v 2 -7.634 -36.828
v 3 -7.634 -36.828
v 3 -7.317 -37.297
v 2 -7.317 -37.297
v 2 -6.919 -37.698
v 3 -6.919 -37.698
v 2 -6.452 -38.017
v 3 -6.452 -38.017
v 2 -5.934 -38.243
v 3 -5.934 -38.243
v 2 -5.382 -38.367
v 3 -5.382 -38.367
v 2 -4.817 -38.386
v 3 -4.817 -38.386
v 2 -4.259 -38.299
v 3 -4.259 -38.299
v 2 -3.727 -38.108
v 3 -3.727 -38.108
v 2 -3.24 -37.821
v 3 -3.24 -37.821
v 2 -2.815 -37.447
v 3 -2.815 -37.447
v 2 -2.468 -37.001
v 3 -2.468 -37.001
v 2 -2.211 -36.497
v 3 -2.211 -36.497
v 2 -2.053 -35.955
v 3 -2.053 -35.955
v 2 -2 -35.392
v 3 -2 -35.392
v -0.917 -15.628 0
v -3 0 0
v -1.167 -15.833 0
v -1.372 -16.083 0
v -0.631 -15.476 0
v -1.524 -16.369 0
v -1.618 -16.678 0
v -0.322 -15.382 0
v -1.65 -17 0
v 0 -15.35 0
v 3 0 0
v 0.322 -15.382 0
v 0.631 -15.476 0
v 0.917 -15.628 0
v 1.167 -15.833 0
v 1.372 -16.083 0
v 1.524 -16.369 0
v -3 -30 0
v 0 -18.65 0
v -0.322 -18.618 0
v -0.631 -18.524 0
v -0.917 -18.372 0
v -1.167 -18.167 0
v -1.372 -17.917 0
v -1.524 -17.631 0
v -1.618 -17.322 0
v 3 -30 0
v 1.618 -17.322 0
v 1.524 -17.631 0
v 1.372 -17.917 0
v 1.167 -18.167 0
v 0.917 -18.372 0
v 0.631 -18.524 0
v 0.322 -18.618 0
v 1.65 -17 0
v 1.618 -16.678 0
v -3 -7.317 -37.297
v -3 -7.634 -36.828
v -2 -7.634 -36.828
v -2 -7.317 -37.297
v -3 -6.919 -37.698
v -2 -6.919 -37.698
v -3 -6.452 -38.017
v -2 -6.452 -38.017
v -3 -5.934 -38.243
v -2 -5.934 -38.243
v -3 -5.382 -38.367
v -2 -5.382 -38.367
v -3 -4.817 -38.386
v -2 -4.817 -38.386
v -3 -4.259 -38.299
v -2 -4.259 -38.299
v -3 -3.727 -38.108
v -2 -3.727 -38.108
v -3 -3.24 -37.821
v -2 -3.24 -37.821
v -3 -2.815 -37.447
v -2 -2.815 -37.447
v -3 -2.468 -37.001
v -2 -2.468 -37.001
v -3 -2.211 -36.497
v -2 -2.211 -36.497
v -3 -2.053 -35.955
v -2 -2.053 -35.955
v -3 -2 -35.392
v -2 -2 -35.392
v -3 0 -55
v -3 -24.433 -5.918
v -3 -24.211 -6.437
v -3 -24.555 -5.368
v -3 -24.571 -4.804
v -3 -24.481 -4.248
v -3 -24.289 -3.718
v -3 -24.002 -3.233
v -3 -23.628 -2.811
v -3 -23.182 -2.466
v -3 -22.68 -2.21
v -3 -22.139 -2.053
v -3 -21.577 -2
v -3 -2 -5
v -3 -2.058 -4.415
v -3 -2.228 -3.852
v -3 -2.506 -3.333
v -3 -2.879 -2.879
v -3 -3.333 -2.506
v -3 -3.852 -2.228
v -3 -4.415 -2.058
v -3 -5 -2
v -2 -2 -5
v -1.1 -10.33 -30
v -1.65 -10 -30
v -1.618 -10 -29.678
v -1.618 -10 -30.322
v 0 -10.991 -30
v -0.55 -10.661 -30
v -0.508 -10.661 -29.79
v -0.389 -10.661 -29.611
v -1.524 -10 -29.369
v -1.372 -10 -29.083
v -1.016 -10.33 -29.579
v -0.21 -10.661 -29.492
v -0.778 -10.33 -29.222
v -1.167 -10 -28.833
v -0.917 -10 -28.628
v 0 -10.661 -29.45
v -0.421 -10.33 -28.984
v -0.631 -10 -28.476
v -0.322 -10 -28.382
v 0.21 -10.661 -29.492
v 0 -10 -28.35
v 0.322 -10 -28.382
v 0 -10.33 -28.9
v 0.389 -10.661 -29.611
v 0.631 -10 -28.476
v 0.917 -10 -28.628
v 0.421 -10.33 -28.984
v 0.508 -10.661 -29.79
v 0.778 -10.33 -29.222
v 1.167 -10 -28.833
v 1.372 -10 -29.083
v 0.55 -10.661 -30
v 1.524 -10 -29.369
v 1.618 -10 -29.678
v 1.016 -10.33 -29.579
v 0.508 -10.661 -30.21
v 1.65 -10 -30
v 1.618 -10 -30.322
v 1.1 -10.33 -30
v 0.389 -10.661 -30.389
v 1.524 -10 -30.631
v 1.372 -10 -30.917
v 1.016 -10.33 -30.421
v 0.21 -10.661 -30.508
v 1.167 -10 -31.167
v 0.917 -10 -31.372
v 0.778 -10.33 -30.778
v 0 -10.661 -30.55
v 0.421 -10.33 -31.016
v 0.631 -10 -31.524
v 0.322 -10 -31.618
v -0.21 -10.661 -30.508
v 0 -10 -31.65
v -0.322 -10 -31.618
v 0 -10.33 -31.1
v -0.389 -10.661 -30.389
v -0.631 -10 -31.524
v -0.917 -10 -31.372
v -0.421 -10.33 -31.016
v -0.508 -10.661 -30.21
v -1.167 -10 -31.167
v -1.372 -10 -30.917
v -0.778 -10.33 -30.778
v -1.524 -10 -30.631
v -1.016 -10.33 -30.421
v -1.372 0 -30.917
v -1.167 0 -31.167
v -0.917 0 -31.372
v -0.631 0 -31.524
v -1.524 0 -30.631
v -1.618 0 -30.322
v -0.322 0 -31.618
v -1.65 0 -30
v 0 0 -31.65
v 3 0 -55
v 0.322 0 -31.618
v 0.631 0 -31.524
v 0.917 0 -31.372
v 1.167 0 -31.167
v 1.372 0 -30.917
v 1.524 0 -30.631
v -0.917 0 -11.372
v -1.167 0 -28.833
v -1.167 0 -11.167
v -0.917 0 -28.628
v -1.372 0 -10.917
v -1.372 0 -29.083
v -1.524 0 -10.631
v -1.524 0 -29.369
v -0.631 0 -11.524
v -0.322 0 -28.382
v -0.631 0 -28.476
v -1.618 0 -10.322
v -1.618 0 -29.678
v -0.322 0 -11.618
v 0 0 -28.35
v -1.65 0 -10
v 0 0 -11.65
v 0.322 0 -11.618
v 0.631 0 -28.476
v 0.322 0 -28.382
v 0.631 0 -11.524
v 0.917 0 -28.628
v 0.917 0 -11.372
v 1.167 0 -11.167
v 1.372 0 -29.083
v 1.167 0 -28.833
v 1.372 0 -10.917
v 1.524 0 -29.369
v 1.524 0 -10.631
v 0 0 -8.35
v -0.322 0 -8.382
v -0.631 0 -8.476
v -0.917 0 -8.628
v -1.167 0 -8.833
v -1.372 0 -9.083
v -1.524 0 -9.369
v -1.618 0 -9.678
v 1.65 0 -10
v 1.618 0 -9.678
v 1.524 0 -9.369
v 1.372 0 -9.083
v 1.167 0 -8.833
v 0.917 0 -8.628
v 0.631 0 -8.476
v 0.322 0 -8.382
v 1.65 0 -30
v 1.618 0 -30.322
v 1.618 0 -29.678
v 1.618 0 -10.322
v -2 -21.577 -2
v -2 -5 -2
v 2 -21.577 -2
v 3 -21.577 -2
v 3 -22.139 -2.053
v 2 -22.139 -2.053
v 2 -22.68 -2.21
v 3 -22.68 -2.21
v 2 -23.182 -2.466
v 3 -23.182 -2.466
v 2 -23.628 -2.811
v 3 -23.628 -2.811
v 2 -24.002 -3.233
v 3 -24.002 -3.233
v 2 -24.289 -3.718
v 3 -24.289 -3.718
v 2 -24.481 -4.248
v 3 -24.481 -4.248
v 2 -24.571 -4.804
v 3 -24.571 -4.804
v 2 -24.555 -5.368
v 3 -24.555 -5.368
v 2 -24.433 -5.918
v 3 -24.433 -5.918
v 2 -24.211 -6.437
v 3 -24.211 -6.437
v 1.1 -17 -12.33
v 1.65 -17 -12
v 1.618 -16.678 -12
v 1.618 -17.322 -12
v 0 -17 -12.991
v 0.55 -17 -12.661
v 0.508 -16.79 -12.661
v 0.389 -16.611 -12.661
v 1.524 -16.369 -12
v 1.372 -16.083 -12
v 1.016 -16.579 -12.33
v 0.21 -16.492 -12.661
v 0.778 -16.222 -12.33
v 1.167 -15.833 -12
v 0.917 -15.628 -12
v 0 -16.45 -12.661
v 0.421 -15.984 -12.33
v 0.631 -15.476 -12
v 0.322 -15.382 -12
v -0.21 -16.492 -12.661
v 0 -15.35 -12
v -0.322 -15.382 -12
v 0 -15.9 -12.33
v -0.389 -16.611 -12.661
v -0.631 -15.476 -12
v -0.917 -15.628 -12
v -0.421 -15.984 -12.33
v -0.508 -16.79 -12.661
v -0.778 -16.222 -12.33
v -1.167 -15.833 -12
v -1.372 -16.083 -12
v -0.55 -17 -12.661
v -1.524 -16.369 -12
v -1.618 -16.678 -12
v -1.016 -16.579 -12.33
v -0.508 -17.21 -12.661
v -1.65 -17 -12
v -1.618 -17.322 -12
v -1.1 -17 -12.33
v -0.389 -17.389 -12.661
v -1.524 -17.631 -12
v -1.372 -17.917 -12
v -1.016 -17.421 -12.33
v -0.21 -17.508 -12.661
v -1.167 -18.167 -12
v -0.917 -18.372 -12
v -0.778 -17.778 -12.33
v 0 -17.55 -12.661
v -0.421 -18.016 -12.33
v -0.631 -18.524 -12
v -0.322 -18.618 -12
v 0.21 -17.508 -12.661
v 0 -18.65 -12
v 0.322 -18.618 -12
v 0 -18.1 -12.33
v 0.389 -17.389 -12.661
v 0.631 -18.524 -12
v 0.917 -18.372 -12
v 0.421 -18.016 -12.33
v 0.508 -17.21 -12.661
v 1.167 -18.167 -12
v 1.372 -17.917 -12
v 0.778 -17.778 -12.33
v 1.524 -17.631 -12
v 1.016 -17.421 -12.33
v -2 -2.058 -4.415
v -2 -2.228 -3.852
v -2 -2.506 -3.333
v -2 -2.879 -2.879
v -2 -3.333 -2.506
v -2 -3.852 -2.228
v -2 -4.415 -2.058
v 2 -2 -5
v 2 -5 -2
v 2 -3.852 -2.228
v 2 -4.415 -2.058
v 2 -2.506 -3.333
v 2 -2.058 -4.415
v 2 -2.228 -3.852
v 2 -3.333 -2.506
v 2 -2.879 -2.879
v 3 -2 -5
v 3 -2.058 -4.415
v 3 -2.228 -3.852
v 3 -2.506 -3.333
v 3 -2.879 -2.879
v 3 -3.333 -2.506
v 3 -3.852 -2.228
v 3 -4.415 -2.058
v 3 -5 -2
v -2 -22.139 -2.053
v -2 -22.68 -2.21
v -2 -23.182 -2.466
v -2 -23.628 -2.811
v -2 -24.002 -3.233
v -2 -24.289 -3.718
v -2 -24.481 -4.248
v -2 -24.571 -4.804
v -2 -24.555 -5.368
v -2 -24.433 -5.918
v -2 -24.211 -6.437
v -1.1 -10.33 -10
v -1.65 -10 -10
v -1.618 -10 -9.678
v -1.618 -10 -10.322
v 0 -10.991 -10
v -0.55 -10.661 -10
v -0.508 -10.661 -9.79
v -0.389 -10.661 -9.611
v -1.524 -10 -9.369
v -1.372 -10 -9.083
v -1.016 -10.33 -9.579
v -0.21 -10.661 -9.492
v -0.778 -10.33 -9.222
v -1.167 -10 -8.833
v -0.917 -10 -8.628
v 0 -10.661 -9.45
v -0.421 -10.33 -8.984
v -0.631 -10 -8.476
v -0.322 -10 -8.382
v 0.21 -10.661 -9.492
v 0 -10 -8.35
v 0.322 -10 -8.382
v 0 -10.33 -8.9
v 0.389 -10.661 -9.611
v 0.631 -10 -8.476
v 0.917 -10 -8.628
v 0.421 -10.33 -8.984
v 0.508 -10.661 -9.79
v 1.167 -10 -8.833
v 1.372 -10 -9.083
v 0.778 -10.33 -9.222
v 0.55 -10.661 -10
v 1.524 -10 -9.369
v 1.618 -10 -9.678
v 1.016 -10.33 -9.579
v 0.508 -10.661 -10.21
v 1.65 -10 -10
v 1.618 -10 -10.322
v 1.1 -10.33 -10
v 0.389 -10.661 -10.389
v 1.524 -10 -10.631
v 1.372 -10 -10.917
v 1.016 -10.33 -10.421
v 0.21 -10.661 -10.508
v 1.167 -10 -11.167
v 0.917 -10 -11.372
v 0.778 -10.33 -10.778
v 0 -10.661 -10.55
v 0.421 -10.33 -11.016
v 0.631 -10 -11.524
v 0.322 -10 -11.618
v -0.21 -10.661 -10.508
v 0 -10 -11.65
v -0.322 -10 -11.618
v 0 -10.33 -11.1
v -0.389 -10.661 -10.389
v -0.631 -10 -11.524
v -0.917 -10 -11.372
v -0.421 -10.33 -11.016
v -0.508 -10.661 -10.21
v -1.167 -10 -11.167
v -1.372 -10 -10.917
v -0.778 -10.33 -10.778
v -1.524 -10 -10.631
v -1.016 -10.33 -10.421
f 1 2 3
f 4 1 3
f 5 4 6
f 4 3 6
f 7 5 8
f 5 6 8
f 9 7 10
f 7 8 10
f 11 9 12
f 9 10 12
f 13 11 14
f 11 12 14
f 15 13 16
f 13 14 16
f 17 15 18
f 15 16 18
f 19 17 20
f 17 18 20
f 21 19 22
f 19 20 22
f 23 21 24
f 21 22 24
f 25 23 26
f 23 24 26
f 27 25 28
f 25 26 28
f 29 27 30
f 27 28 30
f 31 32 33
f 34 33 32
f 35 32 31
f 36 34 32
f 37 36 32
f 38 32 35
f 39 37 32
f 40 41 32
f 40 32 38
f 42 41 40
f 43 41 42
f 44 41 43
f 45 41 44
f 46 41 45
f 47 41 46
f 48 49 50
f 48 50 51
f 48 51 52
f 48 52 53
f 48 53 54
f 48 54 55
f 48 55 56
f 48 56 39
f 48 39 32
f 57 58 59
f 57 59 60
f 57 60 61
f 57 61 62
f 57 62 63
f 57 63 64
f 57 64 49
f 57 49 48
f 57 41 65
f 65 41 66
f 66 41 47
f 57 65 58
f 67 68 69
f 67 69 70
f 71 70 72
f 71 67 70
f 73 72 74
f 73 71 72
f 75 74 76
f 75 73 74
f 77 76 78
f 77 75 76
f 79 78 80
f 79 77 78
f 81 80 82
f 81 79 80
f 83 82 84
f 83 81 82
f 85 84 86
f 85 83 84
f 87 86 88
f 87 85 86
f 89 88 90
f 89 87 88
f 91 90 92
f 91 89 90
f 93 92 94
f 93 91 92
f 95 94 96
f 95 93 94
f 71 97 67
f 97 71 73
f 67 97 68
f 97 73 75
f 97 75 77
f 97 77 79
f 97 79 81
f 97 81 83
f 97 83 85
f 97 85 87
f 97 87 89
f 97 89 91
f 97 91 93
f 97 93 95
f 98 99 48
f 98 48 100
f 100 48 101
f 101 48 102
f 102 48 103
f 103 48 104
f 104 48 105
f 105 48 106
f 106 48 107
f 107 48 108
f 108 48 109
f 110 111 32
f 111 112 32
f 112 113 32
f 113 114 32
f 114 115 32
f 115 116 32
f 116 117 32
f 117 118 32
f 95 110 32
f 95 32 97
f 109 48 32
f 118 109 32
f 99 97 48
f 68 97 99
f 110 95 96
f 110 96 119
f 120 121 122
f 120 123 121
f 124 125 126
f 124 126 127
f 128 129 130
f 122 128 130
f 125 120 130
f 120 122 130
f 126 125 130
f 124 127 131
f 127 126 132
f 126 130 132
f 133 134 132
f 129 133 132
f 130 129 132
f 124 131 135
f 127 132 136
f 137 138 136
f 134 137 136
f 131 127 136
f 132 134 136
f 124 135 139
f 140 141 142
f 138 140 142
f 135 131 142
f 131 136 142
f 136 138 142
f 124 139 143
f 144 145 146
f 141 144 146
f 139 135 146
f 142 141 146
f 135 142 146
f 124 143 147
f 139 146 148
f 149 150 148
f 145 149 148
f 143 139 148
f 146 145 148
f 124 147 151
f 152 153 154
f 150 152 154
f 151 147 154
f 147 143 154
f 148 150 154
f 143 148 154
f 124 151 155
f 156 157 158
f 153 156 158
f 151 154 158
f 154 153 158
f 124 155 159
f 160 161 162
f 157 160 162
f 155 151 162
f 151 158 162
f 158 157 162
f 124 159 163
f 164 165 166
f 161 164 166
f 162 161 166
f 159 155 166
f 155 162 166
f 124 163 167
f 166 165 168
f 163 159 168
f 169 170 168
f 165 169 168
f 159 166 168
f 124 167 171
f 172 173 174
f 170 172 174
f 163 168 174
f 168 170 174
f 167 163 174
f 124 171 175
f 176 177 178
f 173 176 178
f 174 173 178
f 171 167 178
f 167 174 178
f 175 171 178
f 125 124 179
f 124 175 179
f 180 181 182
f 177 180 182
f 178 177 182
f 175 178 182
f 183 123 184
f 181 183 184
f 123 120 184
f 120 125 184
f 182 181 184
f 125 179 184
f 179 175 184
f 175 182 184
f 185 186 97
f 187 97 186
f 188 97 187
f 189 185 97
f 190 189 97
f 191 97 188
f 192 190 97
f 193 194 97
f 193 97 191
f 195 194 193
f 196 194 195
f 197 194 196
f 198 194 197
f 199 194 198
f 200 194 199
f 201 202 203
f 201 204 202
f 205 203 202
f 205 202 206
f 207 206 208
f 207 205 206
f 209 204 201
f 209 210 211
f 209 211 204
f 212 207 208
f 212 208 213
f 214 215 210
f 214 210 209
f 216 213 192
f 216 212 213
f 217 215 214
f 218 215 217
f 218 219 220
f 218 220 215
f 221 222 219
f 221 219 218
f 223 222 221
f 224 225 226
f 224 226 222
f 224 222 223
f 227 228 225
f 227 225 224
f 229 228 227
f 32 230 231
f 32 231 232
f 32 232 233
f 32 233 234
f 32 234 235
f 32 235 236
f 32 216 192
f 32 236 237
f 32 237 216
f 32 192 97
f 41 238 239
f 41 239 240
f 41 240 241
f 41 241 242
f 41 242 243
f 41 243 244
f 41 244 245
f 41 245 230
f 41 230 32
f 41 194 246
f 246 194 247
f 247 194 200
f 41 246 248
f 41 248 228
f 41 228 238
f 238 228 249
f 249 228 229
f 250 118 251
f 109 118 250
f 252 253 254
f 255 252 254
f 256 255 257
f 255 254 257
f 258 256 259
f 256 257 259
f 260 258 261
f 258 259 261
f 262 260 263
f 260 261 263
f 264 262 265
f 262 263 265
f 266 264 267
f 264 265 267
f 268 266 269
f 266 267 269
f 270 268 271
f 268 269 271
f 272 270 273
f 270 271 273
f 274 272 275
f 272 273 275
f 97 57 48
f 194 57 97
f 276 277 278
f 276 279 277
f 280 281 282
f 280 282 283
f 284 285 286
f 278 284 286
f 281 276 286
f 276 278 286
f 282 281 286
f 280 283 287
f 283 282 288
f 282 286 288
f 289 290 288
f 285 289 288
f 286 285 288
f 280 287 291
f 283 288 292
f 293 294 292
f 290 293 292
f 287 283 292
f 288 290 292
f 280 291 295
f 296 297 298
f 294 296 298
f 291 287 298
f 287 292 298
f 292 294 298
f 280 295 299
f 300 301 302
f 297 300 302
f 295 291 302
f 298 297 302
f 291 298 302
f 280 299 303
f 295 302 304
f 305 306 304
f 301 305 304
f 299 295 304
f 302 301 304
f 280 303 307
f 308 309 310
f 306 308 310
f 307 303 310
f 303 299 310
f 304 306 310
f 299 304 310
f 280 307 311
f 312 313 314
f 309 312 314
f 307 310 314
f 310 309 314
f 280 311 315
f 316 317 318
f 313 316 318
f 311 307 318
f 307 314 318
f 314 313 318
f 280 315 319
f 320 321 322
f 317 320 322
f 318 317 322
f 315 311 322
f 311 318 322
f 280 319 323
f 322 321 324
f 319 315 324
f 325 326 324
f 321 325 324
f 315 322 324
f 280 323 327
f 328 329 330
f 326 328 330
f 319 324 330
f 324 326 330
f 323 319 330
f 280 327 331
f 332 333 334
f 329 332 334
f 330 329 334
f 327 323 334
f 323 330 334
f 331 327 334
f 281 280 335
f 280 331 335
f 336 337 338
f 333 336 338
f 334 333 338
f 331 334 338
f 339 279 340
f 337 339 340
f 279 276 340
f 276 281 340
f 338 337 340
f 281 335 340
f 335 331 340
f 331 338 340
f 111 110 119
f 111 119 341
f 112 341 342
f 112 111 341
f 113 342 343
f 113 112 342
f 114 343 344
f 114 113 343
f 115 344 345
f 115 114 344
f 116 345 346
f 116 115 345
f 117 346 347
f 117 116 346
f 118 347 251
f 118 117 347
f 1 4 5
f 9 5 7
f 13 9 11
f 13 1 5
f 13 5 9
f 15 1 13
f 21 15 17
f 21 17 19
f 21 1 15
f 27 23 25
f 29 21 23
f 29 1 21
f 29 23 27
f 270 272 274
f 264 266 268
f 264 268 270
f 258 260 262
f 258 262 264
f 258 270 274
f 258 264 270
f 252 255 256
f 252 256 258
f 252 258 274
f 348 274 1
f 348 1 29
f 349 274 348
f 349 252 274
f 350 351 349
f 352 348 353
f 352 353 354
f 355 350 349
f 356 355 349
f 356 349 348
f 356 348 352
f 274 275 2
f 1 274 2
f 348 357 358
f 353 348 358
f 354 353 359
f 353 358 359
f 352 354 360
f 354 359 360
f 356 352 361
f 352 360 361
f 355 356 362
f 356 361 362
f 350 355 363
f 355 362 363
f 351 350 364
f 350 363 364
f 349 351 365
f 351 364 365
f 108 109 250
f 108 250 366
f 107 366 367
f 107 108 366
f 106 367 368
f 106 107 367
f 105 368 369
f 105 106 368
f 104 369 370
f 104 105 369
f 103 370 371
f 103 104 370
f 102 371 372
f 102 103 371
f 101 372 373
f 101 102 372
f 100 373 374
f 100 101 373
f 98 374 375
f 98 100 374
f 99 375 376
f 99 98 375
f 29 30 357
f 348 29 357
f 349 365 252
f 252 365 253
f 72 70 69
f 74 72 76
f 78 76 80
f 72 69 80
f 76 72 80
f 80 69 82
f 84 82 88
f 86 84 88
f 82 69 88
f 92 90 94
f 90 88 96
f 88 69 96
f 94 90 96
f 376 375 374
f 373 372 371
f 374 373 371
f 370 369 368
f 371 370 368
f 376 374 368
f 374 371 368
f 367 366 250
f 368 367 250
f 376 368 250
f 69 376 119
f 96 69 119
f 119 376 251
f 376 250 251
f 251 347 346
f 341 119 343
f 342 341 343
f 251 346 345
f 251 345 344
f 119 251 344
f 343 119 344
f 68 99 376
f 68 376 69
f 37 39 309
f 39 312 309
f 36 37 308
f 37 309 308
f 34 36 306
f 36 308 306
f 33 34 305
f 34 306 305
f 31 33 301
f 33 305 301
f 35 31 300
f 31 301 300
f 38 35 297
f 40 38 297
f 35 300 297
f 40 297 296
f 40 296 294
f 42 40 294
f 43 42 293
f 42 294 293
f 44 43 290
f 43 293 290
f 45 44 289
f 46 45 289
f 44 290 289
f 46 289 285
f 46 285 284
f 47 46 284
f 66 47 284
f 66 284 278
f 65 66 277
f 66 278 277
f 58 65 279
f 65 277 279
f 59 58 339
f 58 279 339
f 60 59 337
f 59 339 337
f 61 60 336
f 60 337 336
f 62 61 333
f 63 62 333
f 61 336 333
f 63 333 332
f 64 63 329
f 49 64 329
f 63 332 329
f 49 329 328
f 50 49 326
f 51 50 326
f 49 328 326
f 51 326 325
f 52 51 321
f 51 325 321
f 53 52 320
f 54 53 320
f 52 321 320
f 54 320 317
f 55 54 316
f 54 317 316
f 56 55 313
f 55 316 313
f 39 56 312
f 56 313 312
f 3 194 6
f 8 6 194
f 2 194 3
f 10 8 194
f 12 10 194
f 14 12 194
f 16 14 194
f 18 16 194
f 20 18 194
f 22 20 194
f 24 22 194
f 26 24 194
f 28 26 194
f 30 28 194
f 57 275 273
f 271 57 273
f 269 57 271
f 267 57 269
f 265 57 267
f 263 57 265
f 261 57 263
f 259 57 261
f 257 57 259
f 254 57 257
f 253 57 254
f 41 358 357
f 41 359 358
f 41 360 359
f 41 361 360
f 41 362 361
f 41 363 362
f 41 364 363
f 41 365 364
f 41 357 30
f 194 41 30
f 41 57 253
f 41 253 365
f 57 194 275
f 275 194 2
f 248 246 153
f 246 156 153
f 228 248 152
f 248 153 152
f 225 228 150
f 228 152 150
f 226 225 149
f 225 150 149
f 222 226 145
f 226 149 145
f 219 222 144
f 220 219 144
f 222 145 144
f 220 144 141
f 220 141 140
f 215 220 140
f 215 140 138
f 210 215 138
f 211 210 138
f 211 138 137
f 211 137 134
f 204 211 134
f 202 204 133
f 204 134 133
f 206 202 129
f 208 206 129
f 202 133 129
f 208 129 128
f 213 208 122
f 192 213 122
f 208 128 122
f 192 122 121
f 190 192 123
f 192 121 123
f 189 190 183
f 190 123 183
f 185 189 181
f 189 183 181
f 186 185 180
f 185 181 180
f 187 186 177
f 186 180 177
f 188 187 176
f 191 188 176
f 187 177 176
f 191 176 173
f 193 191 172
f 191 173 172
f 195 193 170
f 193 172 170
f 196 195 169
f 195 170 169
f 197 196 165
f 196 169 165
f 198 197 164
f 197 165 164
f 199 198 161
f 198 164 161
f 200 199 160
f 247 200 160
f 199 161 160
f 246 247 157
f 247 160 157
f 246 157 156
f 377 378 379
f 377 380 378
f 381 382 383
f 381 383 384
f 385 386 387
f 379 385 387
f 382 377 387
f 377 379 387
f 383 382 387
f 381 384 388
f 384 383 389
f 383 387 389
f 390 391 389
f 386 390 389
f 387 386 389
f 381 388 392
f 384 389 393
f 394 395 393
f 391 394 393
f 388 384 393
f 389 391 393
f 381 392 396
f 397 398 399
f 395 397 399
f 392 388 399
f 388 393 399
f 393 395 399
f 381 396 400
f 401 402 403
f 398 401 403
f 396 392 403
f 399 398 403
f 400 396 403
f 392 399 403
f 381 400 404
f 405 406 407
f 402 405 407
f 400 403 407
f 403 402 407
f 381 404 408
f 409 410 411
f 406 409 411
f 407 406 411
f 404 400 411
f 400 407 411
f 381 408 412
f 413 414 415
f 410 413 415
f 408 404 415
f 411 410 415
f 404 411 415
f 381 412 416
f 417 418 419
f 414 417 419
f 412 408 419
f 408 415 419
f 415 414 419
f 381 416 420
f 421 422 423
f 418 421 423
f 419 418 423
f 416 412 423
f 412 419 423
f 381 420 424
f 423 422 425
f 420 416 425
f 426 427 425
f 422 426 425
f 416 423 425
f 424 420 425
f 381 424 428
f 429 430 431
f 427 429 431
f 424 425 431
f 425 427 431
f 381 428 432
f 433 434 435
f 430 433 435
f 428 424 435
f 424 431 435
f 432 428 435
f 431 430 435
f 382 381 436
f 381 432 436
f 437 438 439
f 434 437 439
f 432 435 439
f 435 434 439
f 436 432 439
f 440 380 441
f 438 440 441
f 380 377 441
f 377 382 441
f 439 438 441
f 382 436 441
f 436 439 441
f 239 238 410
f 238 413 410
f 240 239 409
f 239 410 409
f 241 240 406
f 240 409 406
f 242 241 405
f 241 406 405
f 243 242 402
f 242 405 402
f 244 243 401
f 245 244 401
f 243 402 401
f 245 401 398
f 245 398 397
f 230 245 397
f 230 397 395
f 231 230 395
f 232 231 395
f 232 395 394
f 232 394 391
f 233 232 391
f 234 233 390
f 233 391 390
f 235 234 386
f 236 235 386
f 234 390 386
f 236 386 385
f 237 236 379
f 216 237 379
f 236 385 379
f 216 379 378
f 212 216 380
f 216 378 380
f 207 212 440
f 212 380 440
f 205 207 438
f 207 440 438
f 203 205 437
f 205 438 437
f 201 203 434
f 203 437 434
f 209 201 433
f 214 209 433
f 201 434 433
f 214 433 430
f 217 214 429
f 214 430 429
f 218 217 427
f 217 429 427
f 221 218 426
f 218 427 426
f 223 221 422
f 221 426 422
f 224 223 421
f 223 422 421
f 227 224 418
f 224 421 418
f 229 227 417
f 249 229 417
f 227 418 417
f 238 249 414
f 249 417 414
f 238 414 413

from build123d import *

# Parameters (mm, degrees)
F1_DEPTH = 3
F3_D     = 3.3
F3_DEPTH = 10
F3_TIP   = 0.9914200214
F5_D     = 3.3
F5_DEPTH = 12
F5_TIP   = 0.9914200214
F7_DEPTH = 1


# Not quite as in the source:
# - a pattern or mirror of a feature is missing from the dataset's text; its kind, count and spacing are read off the source's solid
# - a feature names something its author has since deleted; it is built from what else it names


with BuildPart() as f1:
    # F0 (on Right) → F1 (new body, symmetric)
    with BuildSketch(Plane.YZ):
        Polygon((0, -55), (0, 0), (-30, 0), align=None)
    extrude(amount=F1_DEPTH, both=True)

    # F3
    with Locations(Plane(origin=(0, 0, 0), x_dir=(-1, 0, 0), z_dir=(0, 1, 0))):
        with Locations((0, -10), (0, -30)):
            Hole(F3_D / 2, depth=F3_DEPTH)
            with Locations((0, 0, -(F3_DEPTH + F3_TIP / 2))):  # 118° drill point
                Cone(0, F3_D / 2, F3_TIP, mode=Mode.SUBTRACT)

    # F5
    with Locations(Plane.XY):
        with Locations((0, -17)):
            Hole(F5_D / 2, depth=F5_DEPTH)
            with Locations((0, 0, -(F5_DEPTH + F5_TIP / 2))):  # 118° drill point
                Cone(0, F5_D / 2, F5_TIP, mode=Mode.SUBTRACT)

    # F6 (on face) → F7 (cut)
    with BuildSketch(Plane.YZ.offset(3)):
        with BuildLine():
            ThreePointArc((-2, -5), (-2.8786796564, -2.8786796564), (-5, -2))
            Line((-5, -2), (-21.5772890518, -2))
            ThreePointArc((-21.5772890518, -2), (-24.1569856595, -3.4686067089), (-24.2109757705, -6.436556392))
            Line((-24.2109757705, -6.436556392), (-7.6336867187, -36.8282529869))
            ThreePointArc((-7.6336867187, -36.8282529869), (-4.258737616, -38.2986761404), (-2, -35.3916965949))
            Line((-2, -35.3916965949), (-2, -5))
        make_face()
    f7 = extrude(amount=-F7_DEPTH, mode=Mode.SUBTRACT)

    # F7_copies: F7 across plane
    add(f7.mirror(Plane(origin=(0, 0, 0), x_dir=(0, 0, -1), z_dir=(-1, 0, 0))), mode=Mode.SUBTRACT)


solid = f1.part
